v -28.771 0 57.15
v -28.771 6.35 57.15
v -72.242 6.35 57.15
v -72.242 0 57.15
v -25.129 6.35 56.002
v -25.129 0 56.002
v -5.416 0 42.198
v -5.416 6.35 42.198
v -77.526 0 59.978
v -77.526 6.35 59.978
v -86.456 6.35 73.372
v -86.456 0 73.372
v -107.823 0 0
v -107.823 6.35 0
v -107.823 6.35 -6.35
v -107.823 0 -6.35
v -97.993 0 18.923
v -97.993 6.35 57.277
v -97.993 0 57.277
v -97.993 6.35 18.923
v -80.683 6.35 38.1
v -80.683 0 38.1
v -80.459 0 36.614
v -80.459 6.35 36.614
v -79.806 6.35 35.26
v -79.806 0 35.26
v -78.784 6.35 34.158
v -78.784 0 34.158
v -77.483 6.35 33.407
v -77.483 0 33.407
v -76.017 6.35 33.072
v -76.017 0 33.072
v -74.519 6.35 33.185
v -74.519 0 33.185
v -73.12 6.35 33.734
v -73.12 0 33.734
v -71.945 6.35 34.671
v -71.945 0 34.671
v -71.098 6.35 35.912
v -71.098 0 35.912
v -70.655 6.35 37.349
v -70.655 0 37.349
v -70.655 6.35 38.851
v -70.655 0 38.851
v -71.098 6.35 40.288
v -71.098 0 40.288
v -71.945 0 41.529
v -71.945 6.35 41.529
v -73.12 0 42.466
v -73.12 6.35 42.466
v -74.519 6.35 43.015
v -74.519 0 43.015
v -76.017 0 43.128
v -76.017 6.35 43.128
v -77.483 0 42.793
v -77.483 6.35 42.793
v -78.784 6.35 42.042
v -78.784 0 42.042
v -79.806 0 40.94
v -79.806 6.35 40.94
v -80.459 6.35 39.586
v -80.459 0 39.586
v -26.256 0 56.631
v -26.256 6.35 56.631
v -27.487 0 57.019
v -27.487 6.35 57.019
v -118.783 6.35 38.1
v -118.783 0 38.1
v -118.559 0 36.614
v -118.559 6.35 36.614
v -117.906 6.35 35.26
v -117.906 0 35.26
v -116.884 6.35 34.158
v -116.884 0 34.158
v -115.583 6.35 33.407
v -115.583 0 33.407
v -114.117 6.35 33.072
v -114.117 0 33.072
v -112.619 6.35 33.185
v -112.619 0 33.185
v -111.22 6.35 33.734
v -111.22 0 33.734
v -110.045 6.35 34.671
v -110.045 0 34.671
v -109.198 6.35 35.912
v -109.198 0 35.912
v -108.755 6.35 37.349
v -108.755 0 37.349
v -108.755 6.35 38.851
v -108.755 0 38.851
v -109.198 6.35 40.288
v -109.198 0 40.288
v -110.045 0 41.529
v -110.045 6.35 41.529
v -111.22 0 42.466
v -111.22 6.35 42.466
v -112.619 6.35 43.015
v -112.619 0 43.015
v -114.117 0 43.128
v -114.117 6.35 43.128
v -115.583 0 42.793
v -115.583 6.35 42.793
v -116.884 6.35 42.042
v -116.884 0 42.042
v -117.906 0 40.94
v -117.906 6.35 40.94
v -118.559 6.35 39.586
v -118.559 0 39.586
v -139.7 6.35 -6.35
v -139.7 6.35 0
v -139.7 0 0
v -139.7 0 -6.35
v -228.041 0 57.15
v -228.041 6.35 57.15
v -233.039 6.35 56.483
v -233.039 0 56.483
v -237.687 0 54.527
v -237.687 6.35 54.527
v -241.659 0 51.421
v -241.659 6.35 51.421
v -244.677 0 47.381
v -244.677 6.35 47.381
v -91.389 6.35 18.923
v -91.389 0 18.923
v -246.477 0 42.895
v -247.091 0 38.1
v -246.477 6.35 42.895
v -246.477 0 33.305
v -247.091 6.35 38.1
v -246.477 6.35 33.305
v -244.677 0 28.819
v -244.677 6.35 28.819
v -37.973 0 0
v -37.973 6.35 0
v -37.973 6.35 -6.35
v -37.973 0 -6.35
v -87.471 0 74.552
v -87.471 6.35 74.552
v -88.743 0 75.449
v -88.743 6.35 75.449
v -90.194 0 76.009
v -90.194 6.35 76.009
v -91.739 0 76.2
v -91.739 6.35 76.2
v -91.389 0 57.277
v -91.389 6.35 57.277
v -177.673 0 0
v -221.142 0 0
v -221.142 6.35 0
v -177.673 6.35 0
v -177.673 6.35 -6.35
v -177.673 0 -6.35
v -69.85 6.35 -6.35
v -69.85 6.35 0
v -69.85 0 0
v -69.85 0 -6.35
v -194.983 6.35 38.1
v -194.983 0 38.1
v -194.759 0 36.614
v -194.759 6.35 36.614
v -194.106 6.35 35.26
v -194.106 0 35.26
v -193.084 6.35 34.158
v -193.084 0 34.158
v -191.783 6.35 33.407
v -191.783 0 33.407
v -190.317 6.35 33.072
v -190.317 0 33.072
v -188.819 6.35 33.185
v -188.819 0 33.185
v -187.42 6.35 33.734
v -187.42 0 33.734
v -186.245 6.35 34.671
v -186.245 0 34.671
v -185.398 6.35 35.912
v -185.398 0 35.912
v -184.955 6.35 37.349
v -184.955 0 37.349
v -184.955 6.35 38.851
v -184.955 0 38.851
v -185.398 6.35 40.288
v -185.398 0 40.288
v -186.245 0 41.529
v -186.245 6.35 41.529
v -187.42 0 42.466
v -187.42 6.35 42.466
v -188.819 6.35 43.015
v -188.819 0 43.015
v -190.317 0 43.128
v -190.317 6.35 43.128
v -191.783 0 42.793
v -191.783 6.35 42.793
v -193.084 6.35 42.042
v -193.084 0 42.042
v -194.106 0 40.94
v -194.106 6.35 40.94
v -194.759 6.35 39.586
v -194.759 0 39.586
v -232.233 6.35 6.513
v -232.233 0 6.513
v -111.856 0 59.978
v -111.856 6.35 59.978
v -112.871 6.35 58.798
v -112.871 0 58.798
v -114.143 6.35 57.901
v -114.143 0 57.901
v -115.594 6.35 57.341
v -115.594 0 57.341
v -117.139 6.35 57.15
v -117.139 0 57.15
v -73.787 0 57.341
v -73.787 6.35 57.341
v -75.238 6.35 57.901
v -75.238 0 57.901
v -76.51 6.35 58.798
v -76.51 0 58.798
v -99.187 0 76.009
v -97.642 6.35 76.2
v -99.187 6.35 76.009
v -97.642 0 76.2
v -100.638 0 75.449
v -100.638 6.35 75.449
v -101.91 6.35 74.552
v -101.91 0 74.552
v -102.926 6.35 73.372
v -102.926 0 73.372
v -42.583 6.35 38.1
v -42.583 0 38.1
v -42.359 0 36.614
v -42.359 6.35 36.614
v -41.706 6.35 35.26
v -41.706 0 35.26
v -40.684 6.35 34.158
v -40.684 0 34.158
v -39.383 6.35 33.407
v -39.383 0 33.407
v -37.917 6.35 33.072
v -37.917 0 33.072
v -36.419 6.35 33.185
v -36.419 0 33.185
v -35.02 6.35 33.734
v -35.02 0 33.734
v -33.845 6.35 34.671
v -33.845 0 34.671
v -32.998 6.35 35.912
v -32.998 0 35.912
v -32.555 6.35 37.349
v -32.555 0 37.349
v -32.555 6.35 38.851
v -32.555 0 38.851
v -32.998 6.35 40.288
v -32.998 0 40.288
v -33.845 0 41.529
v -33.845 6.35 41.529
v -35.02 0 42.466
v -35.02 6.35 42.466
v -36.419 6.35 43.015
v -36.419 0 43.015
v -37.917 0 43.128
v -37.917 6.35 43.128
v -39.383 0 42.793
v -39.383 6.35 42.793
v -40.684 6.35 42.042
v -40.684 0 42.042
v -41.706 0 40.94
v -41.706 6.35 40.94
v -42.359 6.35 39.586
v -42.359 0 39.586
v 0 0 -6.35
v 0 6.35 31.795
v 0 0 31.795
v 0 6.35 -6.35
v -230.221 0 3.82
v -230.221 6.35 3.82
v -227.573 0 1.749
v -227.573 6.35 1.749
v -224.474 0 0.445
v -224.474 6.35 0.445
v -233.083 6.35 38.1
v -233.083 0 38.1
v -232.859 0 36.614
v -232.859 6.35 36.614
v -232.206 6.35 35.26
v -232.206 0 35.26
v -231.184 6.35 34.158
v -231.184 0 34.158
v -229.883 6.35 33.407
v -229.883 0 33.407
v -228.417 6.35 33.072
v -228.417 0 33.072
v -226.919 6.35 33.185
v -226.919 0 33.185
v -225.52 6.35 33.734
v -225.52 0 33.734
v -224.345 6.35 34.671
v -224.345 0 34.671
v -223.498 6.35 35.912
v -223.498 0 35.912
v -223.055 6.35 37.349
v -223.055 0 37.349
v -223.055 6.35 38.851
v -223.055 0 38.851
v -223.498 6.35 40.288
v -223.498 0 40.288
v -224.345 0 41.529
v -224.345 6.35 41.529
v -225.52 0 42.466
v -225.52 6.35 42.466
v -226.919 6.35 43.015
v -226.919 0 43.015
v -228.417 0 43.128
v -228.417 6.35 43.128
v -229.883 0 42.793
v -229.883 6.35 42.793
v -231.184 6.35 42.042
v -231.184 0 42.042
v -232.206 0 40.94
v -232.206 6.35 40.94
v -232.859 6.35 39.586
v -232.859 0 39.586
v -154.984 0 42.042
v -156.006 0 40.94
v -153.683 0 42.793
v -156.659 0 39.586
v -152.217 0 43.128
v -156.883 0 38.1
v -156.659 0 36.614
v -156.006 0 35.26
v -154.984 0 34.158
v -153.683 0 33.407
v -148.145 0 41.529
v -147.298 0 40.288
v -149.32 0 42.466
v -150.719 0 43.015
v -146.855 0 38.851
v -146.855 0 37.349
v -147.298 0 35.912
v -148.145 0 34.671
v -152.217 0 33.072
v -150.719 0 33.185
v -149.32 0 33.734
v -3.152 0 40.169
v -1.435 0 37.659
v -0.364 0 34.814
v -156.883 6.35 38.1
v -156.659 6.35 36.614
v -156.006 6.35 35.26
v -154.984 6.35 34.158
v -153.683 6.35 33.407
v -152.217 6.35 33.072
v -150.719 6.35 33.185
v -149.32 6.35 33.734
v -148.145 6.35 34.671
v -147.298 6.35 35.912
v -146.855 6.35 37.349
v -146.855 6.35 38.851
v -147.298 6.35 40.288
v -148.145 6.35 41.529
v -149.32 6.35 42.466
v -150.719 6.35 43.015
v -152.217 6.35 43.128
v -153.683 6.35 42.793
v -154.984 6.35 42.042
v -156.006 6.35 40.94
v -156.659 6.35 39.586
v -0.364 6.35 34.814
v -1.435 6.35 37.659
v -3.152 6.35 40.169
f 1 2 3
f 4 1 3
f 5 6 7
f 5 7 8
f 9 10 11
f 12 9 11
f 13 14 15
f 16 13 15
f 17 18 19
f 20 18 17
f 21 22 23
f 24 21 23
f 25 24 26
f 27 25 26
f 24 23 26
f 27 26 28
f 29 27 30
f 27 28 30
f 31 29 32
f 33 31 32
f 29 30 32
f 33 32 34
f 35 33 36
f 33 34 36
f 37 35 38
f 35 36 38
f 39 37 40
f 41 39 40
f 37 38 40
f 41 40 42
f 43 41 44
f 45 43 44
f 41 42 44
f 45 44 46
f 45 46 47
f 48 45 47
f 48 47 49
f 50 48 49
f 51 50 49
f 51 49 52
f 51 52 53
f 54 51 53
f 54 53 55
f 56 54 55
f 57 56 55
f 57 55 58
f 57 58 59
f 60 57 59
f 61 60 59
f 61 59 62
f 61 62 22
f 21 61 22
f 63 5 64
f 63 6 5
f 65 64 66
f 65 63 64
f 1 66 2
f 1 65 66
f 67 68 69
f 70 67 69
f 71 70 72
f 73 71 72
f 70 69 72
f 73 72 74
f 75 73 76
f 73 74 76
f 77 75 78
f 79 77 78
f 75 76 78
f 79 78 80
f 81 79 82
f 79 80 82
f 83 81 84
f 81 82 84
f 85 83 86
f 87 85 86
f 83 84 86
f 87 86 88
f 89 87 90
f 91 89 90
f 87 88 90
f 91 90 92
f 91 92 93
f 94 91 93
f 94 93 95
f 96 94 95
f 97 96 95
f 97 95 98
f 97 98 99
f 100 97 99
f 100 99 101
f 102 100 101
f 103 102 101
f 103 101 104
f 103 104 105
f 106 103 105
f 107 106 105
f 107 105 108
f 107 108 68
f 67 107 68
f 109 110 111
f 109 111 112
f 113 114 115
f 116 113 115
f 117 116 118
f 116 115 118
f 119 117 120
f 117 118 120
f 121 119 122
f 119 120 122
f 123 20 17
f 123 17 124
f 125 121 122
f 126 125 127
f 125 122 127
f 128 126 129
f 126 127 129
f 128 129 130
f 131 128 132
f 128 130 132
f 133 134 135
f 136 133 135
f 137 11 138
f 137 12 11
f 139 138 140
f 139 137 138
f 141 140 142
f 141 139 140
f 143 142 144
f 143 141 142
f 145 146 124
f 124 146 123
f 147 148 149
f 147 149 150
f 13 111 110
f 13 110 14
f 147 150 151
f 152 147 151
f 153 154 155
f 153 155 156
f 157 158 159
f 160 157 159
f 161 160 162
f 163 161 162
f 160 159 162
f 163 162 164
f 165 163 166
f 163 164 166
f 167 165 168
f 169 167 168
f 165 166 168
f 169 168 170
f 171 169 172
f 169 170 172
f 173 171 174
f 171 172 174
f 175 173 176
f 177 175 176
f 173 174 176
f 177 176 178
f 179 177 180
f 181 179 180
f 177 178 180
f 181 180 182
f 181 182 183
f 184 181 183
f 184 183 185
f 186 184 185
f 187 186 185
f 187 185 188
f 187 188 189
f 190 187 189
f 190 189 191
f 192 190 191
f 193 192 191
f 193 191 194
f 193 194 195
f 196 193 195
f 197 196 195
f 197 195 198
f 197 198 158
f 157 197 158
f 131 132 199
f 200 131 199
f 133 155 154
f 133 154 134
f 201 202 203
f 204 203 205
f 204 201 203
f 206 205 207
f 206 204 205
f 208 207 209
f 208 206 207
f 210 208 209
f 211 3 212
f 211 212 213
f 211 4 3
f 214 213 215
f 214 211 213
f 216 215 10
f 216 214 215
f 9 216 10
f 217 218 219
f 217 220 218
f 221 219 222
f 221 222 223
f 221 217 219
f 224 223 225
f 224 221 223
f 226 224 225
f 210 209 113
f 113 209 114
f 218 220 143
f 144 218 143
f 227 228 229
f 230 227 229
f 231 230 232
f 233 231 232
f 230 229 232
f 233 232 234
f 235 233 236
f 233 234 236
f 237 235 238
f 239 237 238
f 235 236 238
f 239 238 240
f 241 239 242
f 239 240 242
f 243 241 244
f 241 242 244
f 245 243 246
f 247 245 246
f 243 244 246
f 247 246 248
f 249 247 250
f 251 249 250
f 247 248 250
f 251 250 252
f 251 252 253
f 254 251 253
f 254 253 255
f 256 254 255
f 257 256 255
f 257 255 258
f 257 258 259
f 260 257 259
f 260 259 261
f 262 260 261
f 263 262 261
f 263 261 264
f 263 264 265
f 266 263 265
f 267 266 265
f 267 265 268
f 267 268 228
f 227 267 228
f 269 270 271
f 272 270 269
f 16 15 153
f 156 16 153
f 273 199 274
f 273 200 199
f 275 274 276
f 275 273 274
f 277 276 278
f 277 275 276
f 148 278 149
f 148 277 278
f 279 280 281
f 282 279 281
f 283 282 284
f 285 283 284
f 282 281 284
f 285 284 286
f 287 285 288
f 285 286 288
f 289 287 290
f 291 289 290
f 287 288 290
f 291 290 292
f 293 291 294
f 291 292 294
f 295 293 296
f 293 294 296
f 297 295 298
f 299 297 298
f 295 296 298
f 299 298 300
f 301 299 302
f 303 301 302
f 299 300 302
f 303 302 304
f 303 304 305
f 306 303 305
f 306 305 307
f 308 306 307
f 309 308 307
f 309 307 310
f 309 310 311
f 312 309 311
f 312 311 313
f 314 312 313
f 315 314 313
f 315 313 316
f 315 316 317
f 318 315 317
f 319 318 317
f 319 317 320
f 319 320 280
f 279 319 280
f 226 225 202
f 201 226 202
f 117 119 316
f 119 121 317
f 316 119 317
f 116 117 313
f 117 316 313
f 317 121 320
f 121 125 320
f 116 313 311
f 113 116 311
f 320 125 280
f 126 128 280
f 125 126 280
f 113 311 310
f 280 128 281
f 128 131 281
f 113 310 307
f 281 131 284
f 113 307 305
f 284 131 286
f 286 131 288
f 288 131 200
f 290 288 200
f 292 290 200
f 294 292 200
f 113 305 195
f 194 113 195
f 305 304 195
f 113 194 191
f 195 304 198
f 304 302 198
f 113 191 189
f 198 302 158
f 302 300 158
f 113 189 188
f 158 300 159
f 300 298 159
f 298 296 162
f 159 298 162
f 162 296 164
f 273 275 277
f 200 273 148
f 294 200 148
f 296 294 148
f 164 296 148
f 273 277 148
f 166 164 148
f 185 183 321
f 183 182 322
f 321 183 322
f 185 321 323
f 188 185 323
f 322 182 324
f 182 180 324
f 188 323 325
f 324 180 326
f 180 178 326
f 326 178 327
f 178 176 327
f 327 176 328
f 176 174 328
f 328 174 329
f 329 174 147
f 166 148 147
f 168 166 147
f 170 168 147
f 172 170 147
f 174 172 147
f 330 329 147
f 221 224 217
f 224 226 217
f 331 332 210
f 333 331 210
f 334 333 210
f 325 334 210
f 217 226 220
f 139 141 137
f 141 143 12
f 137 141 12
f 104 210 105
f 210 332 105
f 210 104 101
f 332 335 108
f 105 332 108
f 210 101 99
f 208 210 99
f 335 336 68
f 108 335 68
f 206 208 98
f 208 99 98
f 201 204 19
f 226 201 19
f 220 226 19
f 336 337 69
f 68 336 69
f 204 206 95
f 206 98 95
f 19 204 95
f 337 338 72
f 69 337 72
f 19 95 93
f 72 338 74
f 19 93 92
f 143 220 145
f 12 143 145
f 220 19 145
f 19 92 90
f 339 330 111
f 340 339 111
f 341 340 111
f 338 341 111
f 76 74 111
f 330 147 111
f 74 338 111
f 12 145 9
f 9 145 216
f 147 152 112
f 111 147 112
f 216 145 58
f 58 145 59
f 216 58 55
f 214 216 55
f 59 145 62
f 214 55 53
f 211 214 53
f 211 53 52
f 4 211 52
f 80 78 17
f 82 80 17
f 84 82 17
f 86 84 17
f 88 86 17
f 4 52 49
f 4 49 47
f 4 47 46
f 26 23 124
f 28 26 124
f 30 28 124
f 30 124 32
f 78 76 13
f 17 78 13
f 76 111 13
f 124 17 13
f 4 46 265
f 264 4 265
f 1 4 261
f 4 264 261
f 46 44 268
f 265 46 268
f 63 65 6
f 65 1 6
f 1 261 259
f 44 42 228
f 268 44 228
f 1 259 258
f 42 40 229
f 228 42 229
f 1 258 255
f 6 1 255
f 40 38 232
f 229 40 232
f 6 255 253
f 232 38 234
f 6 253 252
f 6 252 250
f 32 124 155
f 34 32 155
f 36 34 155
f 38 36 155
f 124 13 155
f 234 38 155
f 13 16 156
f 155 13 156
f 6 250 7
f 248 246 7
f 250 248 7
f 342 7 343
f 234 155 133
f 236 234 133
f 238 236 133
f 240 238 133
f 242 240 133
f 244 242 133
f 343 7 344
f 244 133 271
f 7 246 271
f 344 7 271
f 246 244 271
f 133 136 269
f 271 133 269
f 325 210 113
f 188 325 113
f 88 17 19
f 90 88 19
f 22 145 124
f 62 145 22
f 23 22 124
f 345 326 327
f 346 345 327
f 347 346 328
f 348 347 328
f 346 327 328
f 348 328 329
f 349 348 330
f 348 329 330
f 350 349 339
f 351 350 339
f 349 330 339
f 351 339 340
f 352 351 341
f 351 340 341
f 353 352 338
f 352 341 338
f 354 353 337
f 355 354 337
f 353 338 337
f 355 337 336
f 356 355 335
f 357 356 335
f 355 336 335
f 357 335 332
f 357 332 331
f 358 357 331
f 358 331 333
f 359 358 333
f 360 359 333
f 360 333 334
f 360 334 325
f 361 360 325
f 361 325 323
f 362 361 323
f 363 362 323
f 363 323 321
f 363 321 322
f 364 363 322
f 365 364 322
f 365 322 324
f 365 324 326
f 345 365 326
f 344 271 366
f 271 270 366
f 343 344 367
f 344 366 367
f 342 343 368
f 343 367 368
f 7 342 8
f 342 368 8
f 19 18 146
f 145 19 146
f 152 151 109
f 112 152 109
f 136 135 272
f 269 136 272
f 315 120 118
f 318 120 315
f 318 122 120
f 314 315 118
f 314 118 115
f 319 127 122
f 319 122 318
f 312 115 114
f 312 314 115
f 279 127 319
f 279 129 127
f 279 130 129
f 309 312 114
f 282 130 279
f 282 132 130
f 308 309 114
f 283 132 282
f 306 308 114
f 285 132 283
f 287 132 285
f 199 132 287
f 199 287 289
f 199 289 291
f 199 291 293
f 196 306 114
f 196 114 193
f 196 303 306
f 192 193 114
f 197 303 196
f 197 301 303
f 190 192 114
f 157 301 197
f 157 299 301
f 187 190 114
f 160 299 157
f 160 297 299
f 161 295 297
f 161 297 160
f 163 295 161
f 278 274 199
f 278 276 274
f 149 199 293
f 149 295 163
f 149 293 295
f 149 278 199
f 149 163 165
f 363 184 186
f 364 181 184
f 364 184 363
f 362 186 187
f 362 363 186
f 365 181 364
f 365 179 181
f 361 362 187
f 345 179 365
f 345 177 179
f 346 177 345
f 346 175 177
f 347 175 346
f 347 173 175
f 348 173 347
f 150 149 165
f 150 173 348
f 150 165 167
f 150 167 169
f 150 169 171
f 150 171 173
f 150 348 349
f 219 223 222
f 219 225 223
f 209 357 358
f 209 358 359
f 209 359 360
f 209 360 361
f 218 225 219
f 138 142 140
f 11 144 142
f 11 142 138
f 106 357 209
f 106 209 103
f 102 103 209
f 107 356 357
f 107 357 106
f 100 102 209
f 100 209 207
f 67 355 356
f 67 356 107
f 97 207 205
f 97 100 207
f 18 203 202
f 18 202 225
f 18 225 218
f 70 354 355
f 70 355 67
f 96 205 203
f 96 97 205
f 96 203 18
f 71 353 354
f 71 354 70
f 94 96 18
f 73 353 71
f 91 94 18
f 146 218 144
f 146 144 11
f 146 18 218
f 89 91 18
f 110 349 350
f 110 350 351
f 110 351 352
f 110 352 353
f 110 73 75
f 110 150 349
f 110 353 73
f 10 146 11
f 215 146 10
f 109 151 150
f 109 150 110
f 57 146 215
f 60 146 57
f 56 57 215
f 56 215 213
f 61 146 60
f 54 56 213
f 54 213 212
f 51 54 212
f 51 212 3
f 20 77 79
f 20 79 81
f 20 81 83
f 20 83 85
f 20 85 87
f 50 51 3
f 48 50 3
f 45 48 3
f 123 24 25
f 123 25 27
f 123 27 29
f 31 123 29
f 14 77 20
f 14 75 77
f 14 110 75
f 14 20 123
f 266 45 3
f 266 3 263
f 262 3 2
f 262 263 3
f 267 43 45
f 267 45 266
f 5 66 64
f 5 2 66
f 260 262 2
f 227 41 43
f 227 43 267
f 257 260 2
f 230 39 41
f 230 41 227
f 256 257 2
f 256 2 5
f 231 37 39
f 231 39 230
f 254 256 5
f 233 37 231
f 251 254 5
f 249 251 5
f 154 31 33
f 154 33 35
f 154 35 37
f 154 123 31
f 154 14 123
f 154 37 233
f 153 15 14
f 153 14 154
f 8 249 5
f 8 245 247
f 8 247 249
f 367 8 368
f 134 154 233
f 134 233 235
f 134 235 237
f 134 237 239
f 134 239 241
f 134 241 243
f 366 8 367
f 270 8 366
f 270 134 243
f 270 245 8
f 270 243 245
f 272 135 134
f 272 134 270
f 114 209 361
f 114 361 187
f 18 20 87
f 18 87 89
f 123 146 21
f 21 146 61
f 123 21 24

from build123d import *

# Parameters (mm, degrees)
SKETCH1_W               = 304.8
SKETCH1_H               = 76.2
BOSS_EXTRUDE1_DEPTH     = 6.35
CHAMFER1_SIZE           = 53.975
CHAMFER1_SIZE2          = 37.793701875
SKETCH2_W               = 37.973
SKETCH2_H               = 6.35
BOSS_EXTRUDE2_DEPTH     = 6.35
LPATTERN1_COUNT         = 3
LPATTERN1_PITCH         = 69.85
F_3_8_CLEARANCE_HOLE1_D = 10.0838
CUT_EXTRUDE1_DEPTH      = 7.35
FILLET1_R               = 12.7
SKETCH7_W               = 6.604
SKETCH7_H               = 38.354
CUT_EXTRUDE2_DEPTH      = 7.35
CUT_EXTRUDE3_DEPTH      = 7.35
FILLET2_R               = 6.35


with BuildPart() as part:
    # Sketch1 → Boss-Extrude1 (new body)
    with BuildSketch(Plane(origin=(0, 0, 0), x_dir=(1, 0, 0), z_dir=(0, 1, 0))):
        with Locations((-152.4, -38.1)):
            Rectangle(SKETCH1_W, SKETCH1_H)
    extrude(amount=BOSS_EXTRUDE1_DEPTH)

    # Chamfer1
    chamfer1_edges = [part.edges().sort_by_distance(p)[0] for p in [
        (0, 3.175, 76.2),
    ]]
    chamfer1_side = [part.faces().sort_by_distance(p)[0] for p in [
        (-152.4, 3.175, 76.2),
    ]]
    chamfer(chamfer1_edges, length=CHAMFER1_SIZE, length2=CHAMFER1_SIZE2, reference=chamfer1_side[0])

    # Sketch2 → Boss-Extrude2 (add)
    with BuildSketch(Plane(origin=(0, 6.35, 0), x_dir=(1, 0, 0), z_dir=(0, 1, 0))):
        with Locations((-18.9865, 3.175)):
            Rectangle(SKETCH2_W, SKETCH2_H)
    boss_extrude2 = extrude(amount=-BOSS_EXTRUDE2_DEPTH)

    # LPattern1: Boss-Extrude2 ×3
    with Locations(*[(-i * LPATTERN1_PITCH, 0, 0) for i in range(1, LPATTERN1_COUNT)]):
        add(boss_extrude2)

    # 3/8 Clearance Hole1 (through all)
    with Locations(Plane(origin=(0, 6.35, 0), x_dir=(1, 0, 0), z_dir=(0, 1, 0))):
        with Locations((-37.5406093, -38.1), (-75.6406093, -38.1), (-113.7406093, -38.1), (-151.8406093, -38.1), (-189.9406093, -38.1), (-228.0406093, -38.1)):
            Hole(F_3_8_CLEARANCE_HOLE1_D / 2)

    # Sketch6 → Cut-Extrude1 (cut, through all)
    with BuildSketch(Plane(origin=(0, 6.35, 0), x_dir=(1, 0, 0), z_dir=(0, 1, 0))):
        with BuildLine():
            Line((-244.677025408, -28.8192587), (-228.6, 0))
            Line((-228.6, 0), (-304.8, 0))
            Line((-304.8, 0), (-304.8, -76.2))
            Line((-304.8, -76.2), (-228.6, -76.2))
            Line((-228.6, -76.2), (-244.677025408, -47.3807413))
            ThreePointArc((-244.677025408, -47.3807413), (-247.0906093, -38.1), (-244.677025408, -28.8192587))
        make_face()
    extrude(amount=-CUT_EXTRUDE1_DEPTH, mode=Mode.SUBTRACT)

    # Fillet1
    fillet1_edges = [part.edges().sort_by_distance(p)[0] for p in [
        (-228.6, 3.175, 76.2),
        (-228.6, 3.175, 0),
        (0, 3.175, 38.406298125),
        (-53.975, 3.175, 76.2),
    ]]
    fillet(fillet1_edges, radius=FILLET1_R)

    # Sketch7 → Cut-Extrude2 (cut, through all)
    with BuildSketch(Plane(origin=(0, 6.35, 0), x_dir=(1, 0, 0), z_dir=(0, 1, 0))):
        with Locations((-94.6906093, -38.1)):
            Rectangle(SKETCH7_W, SKETCH7_H)
    extrude(amount=-CUT_EXTRUDE2_DEPTH, mode=Mode.SUBTRACT)

    # Sketch8 → Cut-Extrude3 (cut, through all)
    with BuildSketch(Plane(origin=(0, 6.35, 0), x_dir=(1, 0, 0), z_dir=(0, 1, 0))):
        with BuildLine():
            Line((-113.7406093, -57.15), (-228.0406093, -57.15))
            ThreePointArc((-228.0406093, -57.15), (-237.686965561, -54.527121199), (-244.677025408, -47.3807413))
            Line((-244.677025408, -47.3807413), (-232.233232947, -69.687160867))
            ThreePointArc((-232.233232947, -69.687160867), (-227.573193049, -74.451414133), (-221.142288875, -76.2))
            Line((-221.142288875, -76.2), (-101.0406093, -76.2))
            Line((-101.0406093, -76.2), (-113.7406093, -57.15))
        make_face()
        with BuildLine():
            Line((-75.6406093, -57.15), (-88.3406093, -76.2))
            Line((-88.3406093, -76.2), (-57.979294619, -76.2))
            ThreePointArc((-57.979294619, -76.2), (-54.160330965, -75.612205275), (-50.694873877, -73.903230962))
            Line((-50.694873877, -73.903230962), (-26.768780472, -57.15))
            Line((-26.768780472, -57.15), (-75.6406093, -57.15))
        make_face()
    extrude(amount=-CUT_EXTRUDE3_DEPTH, mode=Mode.SUBTRACT)

    # Fillet2
    fillet2_edges = [part.edges().sort_by_distance(p)[0] for p in [
        (-113.7406093, 3.175, 57.15),
        (-101.0406093, 3.175, 76.2),
        (-75.6406093, 3.175, 57.15),
        (-26.768780472, 3.175, 57.15),
        (-88.3406093, 3.175, 76.2),
    ]]
    fillet(fillet2_edges, radius=FILLET2_R)


solid = part.part
